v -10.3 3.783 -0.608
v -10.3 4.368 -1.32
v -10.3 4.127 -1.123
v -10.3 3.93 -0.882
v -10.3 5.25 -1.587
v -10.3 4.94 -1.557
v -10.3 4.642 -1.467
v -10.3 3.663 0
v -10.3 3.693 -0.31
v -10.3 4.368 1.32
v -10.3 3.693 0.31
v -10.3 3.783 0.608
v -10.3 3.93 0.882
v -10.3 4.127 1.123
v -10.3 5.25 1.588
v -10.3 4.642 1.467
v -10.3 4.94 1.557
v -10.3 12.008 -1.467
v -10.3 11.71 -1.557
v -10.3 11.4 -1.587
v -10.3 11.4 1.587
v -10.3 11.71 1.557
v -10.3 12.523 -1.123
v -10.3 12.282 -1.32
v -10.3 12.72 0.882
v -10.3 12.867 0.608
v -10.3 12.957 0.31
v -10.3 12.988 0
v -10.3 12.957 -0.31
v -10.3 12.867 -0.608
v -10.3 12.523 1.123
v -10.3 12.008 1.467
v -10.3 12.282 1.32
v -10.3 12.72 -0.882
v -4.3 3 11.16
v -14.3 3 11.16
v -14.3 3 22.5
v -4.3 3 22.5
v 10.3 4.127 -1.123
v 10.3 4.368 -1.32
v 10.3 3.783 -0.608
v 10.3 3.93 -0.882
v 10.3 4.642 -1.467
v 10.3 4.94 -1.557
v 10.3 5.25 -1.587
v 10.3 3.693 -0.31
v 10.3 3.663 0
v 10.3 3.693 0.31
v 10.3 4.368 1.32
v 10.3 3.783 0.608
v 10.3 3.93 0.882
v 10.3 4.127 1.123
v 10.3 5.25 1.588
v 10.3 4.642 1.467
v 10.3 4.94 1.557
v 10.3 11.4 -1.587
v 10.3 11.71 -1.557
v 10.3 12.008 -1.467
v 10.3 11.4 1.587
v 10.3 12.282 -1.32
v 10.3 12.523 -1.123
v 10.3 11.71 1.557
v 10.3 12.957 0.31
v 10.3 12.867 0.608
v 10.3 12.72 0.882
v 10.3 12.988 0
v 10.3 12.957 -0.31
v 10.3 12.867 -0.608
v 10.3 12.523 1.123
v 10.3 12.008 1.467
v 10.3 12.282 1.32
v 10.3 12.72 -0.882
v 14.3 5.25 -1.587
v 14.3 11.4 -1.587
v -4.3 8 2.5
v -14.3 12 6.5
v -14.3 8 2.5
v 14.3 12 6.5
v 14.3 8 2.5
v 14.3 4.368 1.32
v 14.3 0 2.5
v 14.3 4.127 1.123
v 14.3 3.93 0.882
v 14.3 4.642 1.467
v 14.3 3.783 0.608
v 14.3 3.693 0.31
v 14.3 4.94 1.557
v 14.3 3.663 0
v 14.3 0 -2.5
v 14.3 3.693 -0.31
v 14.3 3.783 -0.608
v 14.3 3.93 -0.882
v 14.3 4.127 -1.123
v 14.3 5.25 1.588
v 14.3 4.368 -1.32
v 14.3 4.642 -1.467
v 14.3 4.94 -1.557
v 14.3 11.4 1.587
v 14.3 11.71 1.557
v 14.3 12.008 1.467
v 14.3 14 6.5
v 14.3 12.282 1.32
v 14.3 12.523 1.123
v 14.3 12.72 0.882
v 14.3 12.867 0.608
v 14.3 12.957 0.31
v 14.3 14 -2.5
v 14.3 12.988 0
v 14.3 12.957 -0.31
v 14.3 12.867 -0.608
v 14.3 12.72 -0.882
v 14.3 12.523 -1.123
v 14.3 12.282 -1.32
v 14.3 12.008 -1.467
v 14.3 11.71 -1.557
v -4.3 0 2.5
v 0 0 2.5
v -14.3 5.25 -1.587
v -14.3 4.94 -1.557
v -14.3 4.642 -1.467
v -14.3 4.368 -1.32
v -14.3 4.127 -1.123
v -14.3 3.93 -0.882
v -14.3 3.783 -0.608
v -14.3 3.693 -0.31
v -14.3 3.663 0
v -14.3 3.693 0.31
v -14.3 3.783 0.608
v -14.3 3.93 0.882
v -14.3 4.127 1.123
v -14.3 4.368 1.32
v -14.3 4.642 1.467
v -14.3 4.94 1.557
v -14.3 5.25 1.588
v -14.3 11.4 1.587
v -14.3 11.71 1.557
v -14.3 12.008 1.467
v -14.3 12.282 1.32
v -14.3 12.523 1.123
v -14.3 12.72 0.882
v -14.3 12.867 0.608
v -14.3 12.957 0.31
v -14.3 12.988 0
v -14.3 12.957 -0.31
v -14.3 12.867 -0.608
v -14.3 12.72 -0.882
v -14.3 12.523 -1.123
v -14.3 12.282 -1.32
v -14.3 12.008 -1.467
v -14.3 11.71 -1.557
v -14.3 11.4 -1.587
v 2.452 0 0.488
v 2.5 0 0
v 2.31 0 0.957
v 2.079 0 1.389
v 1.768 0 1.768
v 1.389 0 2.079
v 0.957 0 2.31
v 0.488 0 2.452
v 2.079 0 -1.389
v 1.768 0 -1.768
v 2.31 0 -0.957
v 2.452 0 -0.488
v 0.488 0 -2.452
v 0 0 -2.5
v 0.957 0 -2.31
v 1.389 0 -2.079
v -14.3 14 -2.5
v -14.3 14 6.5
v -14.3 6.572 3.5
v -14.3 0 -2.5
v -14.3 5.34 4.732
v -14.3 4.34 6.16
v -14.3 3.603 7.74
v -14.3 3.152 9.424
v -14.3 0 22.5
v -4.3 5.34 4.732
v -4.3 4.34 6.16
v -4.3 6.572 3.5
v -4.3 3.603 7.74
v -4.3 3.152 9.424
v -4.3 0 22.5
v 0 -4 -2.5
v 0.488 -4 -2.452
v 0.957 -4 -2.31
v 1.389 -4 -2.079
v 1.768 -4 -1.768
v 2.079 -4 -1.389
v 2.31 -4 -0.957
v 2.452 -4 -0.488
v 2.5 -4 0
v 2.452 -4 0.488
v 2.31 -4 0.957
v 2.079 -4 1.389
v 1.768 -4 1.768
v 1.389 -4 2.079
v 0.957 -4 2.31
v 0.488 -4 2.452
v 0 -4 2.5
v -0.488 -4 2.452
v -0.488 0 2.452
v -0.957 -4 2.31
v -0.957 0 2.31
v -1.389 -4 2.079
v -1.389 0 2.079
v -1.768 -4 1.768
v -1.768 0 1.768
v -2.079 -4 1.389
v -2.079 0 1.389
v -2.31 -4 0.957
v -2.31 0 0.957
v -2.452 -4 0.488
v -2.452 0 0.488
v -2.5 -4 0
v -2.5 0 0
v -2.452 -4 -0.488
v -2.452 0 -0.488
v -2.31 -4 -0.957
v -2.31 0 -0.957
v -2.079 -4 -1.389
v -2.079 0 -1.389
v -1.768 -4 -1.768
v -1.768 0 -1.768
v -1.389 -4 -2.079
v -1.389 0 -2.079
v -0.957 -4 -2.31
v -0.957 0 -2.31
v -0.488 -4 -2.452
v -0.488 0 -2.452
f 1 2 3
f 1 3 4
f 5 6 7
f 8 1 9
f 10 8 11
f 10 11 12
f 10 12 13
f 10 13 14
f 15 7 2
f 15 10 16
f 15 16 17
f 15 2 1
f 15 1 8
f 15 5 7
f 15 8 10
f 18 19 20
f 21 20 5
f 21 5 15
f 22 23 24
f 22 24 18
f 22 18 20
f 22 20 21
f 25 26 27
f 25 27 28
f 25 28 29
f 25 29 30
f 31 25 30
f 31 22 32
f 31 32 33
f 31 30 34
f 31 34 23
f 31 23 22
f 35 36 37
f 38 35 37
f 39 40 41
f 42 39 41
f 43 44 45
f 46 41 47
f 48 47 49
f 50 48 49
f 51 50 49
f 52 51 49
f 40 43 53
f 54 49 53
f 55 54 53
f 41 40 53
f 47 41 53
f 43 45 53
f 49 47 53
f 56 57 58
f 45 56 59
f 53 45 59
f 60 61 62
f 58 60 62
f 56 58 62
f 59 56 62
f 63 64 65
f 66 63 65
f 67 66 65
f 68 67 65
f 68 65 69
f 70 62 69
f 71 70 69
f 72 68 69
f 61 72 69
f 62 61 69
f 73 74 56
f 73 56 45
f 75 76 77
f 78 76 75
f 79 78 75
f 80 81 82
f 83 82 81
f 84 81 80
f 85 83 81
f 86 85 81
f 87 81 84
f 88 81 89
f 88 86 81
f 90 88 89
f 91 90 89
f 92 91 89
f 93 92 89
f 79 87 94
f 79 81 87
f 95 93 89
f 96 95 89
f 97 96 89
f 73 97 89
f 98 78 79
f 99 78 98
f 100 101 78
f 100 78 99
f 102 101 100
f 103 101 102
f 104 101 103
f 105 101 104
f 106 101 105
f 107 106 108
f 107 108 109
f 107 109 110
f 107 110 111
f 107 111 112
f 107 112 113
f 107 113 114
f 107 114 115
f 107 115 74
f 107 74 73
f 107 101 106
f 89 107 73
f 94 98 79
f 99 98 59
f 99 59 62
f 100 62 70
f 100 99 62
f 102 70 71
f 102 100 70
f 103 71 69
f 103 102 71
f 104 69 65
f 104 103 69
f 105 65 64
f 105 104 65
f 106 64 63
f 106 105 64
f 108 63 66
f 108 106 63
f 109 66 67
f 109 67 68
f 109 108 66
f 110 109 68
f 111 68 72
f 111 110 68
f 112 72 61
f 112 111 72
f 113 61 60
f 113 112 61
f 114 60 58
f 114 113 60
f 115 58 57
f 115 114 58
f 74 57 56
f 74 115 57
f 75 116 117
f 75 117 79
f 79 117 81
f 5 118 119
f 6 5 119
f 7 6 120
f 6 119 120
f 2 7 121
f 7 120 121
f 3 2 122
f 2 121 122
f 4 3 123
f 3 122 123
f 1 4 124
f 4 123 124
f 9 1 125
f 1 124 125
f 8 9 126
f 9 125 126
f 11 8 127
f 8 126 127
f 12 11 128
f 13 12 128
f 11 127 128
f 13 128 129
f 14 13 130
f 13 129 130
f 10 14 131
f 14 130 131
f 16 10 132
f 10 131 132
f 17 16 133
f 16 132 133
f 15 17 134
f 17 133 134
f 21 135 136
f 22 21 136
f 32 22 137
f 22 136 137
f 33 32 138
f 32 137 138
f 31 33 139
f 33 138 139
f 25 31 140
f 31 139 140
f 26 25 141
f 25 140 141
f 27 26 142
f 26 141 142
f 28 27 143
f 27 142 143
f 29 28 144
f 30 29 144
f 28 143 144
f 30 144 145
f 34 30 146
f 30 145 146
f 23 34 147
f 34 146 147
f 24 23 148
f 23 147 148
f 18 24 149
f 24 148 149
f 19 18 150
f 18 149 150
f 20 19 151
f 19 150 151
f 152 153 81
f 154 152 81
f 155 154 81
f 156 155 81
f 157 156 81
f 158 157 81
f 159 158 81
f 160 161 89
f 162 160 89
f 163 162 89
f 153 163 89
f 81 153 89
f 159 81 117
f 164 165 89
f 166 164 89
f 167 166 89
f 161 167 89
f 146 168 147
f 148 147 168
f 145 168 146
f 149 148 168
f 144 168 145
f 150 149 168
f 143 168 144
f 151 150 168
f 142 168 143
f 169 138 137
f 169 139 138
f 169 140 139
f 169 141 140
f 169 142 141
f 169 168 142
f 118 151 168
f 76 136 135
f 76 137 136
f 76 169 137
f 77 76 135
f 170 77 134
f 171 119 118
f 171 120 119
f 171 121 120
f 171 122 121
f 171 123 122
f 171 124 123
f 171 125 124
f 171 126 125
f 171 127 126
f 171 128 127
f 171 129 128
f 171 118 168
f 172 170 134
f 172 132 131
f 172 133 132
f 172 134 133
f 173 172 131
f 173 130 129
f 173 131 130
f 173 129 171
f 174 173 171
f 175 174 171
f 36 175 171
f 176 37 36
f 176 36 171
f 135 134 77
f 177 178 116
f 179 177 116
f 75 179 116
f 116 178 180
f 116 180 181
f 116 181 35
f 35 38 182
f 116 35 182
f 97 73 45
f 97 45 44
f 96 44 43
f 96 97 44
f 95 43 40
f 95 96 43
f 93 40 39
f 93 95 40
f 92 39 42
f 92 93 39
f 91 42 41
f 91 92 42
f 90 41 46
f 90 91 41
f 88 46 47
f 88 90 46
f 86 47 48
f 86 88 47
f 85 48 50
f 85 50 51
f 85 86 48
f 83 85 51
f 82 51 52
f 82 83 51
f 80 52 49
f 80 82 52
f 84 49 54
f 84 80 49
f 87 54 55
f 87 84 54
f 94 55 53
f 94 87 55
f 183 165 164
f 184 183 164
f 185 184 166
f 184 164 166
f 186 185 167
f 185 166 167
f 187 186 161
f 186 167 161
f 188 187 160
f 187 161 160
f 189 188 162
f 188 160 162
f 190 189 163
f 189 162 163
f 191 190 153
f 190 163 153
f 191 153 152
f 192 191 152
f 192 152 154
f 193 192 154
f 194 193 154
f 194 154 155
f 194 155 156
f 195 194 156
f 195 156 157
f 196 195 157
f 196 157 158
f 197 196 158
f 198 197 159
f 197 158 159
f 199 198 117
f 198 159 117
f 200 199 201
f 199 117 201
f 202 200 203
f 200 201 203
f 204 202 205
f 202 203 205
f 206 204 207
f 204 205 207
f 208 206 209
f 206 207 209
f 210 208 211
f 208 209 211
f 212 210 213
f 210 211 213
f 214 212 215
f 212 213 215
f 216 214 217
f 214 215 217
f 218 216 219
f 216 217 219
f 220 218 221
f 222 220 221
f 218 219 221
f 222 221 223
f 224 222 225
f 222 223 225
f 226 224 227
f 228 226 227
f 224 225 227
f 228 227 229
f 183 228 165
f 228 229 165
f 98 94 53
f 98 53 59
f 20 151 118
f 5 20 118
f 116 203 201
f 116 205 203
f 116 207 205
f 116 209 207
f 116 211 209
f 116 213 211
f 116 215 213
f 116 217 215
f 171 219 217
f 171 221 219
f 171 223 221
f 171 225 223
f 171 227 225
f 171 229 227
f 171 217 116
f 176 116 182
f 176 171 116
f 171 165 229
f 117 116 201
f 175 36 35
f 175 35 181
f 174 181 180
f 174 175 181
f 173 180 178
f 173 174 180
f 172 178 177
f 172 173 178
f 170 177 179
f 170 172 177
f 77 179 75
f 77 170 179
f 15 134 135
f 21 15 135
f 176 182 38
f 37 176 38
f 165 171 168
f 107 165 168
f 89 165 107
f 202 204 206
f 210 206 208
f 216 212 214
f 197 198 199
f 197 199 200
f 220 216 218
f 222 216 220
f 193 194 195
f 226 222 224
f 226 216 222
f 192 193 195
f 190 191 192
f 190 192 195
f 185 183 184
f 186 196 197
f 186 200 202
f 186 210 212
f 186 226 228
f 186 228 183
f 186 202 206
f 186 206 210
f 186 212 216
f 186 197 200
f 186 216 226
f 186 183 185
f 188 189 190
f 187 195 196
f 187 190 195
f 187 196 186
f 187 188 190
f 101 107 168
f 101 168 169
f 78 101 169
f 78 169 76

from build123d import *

# Parameters (mm, degrees)
SKETCH1_W           = 28.6
SKETCH1_H           = 5
BOSS_EXTRUDE1_DEPTH = 14
CUT_EXTRUDE1_DEPTH  = 4
SKETCH5_R           = 2.5
BOSS_EXTRUDE4_DEPTH = 4
BOSS_EXTRUDE5_DEPTH = 28.6
SKETCH7_W           = 20
SKETCH7_H           = 3
BOSS_EXTRUDE6_DEPTH = 10
FILLET1_R           = 10


with BuildPart() as part:
    # Sketch1 → Boss-Extrude1 (new body)
    with BuildSketch(Plane(origin=(0, 0, 0), x_dir=(1, 0, 0), z_dir=(0, 1, 0))):
        Rectangle(SKETCH1_W, SKETCH1_H)
    extrude(amount=BOSS_EXTRUDE1_DEPTH)

    # Sketch2 → Cut-Extrude1 (cut)
    with BuildSketch(Plane(origin=(14.3, 0, 0), x_dir=(0, 0, -1), z_dir=(1, 0, 0))):
        with BuildLine():
            Line((-1.5875, 5.25), (-1.5875, 11.4))
            ThreePointArc((-1.5875, 11.4), (0, 12.9875), (1.5875, 11.4))
            Line((1.5875, 11.4), (1.5875, 5.25))
            ThreePointArc((1.5875, 5.25), (0, 3.6625), (-1.5875, 5.25))
        make_face()
    cut_extrude1 = extrude(amount=-CUT_EXTRUDE1_DEPTH, mode=Mode.SUBTRACT)

    # Sketch5 → Boss-Extrude4 (add)
    with BuildSketch(Plane.XZ):
        with Locations(Location((0, 0, 0), (0, 0, 270))):
            Circle(SKETCH5_R)
    extrude(amount=BOSS_EXTRUDE4_DEPTH)

    # Sketch6 → Boss-Extrude5 (add)
    with BuildSketch(Plane(origin=(14.3, 0, 0), x_dir=(0, 0, -1), z_dir=(1, 0, 0))):
        Polygon((-2.5, 14), (-6.5, 14), (-6.5, 12), (-2.5, 8), align=None)
    extrude(amount=-BOSS_EXTRUDE5_DEPTH)

    # Mirror1: Cut-Extrude1 across plane
    add(cut_extrude1.mirror(Plane(origin=(0, 0, 0), x_dir=(0, 0, 1), z_dir=(1, 0, 0))), mode=Mode.SUBTRACT)

    # Sketch7 → Boss-Extrude6 (add)
    with BuildSketch(Plane.ZY.offset(14.3)):
        with Locations((12.5, 1.5)):
            Rectangle(SKETCH7_W, SKETCH7_H)
    extrude(amount=-BOSS_EXTRUDE6_DEPTH)

    # Fillet1
    # the kernel refuses this fillet: 10 mm, written as the material it adds along each edge
    with BuildSketch(Plane(origin=(-14.3, 3, 2.5), x_dir=(0, 1, 0), z_dir=(1, 0, 0))) as fillet1_piece_1:
        with BuildLine():
            CenterArc((10, 8.660254038), FILLET1_R, 180, 60)
            Line((0, 8.660254038), (-0.2, 8.660254038))
            Line((-0.2, 8.660254038), (-0.2, 0))
            Line((-0.2, 0), (0, -0.2))
            ThreePointArc((0, -0.2), (2.5, -0.2), (4.9, -0.173205081))
            Line((4.9, -0.173205081), (5, 0))
        make_face()
    extrude(amount=10)


solid = part.part
